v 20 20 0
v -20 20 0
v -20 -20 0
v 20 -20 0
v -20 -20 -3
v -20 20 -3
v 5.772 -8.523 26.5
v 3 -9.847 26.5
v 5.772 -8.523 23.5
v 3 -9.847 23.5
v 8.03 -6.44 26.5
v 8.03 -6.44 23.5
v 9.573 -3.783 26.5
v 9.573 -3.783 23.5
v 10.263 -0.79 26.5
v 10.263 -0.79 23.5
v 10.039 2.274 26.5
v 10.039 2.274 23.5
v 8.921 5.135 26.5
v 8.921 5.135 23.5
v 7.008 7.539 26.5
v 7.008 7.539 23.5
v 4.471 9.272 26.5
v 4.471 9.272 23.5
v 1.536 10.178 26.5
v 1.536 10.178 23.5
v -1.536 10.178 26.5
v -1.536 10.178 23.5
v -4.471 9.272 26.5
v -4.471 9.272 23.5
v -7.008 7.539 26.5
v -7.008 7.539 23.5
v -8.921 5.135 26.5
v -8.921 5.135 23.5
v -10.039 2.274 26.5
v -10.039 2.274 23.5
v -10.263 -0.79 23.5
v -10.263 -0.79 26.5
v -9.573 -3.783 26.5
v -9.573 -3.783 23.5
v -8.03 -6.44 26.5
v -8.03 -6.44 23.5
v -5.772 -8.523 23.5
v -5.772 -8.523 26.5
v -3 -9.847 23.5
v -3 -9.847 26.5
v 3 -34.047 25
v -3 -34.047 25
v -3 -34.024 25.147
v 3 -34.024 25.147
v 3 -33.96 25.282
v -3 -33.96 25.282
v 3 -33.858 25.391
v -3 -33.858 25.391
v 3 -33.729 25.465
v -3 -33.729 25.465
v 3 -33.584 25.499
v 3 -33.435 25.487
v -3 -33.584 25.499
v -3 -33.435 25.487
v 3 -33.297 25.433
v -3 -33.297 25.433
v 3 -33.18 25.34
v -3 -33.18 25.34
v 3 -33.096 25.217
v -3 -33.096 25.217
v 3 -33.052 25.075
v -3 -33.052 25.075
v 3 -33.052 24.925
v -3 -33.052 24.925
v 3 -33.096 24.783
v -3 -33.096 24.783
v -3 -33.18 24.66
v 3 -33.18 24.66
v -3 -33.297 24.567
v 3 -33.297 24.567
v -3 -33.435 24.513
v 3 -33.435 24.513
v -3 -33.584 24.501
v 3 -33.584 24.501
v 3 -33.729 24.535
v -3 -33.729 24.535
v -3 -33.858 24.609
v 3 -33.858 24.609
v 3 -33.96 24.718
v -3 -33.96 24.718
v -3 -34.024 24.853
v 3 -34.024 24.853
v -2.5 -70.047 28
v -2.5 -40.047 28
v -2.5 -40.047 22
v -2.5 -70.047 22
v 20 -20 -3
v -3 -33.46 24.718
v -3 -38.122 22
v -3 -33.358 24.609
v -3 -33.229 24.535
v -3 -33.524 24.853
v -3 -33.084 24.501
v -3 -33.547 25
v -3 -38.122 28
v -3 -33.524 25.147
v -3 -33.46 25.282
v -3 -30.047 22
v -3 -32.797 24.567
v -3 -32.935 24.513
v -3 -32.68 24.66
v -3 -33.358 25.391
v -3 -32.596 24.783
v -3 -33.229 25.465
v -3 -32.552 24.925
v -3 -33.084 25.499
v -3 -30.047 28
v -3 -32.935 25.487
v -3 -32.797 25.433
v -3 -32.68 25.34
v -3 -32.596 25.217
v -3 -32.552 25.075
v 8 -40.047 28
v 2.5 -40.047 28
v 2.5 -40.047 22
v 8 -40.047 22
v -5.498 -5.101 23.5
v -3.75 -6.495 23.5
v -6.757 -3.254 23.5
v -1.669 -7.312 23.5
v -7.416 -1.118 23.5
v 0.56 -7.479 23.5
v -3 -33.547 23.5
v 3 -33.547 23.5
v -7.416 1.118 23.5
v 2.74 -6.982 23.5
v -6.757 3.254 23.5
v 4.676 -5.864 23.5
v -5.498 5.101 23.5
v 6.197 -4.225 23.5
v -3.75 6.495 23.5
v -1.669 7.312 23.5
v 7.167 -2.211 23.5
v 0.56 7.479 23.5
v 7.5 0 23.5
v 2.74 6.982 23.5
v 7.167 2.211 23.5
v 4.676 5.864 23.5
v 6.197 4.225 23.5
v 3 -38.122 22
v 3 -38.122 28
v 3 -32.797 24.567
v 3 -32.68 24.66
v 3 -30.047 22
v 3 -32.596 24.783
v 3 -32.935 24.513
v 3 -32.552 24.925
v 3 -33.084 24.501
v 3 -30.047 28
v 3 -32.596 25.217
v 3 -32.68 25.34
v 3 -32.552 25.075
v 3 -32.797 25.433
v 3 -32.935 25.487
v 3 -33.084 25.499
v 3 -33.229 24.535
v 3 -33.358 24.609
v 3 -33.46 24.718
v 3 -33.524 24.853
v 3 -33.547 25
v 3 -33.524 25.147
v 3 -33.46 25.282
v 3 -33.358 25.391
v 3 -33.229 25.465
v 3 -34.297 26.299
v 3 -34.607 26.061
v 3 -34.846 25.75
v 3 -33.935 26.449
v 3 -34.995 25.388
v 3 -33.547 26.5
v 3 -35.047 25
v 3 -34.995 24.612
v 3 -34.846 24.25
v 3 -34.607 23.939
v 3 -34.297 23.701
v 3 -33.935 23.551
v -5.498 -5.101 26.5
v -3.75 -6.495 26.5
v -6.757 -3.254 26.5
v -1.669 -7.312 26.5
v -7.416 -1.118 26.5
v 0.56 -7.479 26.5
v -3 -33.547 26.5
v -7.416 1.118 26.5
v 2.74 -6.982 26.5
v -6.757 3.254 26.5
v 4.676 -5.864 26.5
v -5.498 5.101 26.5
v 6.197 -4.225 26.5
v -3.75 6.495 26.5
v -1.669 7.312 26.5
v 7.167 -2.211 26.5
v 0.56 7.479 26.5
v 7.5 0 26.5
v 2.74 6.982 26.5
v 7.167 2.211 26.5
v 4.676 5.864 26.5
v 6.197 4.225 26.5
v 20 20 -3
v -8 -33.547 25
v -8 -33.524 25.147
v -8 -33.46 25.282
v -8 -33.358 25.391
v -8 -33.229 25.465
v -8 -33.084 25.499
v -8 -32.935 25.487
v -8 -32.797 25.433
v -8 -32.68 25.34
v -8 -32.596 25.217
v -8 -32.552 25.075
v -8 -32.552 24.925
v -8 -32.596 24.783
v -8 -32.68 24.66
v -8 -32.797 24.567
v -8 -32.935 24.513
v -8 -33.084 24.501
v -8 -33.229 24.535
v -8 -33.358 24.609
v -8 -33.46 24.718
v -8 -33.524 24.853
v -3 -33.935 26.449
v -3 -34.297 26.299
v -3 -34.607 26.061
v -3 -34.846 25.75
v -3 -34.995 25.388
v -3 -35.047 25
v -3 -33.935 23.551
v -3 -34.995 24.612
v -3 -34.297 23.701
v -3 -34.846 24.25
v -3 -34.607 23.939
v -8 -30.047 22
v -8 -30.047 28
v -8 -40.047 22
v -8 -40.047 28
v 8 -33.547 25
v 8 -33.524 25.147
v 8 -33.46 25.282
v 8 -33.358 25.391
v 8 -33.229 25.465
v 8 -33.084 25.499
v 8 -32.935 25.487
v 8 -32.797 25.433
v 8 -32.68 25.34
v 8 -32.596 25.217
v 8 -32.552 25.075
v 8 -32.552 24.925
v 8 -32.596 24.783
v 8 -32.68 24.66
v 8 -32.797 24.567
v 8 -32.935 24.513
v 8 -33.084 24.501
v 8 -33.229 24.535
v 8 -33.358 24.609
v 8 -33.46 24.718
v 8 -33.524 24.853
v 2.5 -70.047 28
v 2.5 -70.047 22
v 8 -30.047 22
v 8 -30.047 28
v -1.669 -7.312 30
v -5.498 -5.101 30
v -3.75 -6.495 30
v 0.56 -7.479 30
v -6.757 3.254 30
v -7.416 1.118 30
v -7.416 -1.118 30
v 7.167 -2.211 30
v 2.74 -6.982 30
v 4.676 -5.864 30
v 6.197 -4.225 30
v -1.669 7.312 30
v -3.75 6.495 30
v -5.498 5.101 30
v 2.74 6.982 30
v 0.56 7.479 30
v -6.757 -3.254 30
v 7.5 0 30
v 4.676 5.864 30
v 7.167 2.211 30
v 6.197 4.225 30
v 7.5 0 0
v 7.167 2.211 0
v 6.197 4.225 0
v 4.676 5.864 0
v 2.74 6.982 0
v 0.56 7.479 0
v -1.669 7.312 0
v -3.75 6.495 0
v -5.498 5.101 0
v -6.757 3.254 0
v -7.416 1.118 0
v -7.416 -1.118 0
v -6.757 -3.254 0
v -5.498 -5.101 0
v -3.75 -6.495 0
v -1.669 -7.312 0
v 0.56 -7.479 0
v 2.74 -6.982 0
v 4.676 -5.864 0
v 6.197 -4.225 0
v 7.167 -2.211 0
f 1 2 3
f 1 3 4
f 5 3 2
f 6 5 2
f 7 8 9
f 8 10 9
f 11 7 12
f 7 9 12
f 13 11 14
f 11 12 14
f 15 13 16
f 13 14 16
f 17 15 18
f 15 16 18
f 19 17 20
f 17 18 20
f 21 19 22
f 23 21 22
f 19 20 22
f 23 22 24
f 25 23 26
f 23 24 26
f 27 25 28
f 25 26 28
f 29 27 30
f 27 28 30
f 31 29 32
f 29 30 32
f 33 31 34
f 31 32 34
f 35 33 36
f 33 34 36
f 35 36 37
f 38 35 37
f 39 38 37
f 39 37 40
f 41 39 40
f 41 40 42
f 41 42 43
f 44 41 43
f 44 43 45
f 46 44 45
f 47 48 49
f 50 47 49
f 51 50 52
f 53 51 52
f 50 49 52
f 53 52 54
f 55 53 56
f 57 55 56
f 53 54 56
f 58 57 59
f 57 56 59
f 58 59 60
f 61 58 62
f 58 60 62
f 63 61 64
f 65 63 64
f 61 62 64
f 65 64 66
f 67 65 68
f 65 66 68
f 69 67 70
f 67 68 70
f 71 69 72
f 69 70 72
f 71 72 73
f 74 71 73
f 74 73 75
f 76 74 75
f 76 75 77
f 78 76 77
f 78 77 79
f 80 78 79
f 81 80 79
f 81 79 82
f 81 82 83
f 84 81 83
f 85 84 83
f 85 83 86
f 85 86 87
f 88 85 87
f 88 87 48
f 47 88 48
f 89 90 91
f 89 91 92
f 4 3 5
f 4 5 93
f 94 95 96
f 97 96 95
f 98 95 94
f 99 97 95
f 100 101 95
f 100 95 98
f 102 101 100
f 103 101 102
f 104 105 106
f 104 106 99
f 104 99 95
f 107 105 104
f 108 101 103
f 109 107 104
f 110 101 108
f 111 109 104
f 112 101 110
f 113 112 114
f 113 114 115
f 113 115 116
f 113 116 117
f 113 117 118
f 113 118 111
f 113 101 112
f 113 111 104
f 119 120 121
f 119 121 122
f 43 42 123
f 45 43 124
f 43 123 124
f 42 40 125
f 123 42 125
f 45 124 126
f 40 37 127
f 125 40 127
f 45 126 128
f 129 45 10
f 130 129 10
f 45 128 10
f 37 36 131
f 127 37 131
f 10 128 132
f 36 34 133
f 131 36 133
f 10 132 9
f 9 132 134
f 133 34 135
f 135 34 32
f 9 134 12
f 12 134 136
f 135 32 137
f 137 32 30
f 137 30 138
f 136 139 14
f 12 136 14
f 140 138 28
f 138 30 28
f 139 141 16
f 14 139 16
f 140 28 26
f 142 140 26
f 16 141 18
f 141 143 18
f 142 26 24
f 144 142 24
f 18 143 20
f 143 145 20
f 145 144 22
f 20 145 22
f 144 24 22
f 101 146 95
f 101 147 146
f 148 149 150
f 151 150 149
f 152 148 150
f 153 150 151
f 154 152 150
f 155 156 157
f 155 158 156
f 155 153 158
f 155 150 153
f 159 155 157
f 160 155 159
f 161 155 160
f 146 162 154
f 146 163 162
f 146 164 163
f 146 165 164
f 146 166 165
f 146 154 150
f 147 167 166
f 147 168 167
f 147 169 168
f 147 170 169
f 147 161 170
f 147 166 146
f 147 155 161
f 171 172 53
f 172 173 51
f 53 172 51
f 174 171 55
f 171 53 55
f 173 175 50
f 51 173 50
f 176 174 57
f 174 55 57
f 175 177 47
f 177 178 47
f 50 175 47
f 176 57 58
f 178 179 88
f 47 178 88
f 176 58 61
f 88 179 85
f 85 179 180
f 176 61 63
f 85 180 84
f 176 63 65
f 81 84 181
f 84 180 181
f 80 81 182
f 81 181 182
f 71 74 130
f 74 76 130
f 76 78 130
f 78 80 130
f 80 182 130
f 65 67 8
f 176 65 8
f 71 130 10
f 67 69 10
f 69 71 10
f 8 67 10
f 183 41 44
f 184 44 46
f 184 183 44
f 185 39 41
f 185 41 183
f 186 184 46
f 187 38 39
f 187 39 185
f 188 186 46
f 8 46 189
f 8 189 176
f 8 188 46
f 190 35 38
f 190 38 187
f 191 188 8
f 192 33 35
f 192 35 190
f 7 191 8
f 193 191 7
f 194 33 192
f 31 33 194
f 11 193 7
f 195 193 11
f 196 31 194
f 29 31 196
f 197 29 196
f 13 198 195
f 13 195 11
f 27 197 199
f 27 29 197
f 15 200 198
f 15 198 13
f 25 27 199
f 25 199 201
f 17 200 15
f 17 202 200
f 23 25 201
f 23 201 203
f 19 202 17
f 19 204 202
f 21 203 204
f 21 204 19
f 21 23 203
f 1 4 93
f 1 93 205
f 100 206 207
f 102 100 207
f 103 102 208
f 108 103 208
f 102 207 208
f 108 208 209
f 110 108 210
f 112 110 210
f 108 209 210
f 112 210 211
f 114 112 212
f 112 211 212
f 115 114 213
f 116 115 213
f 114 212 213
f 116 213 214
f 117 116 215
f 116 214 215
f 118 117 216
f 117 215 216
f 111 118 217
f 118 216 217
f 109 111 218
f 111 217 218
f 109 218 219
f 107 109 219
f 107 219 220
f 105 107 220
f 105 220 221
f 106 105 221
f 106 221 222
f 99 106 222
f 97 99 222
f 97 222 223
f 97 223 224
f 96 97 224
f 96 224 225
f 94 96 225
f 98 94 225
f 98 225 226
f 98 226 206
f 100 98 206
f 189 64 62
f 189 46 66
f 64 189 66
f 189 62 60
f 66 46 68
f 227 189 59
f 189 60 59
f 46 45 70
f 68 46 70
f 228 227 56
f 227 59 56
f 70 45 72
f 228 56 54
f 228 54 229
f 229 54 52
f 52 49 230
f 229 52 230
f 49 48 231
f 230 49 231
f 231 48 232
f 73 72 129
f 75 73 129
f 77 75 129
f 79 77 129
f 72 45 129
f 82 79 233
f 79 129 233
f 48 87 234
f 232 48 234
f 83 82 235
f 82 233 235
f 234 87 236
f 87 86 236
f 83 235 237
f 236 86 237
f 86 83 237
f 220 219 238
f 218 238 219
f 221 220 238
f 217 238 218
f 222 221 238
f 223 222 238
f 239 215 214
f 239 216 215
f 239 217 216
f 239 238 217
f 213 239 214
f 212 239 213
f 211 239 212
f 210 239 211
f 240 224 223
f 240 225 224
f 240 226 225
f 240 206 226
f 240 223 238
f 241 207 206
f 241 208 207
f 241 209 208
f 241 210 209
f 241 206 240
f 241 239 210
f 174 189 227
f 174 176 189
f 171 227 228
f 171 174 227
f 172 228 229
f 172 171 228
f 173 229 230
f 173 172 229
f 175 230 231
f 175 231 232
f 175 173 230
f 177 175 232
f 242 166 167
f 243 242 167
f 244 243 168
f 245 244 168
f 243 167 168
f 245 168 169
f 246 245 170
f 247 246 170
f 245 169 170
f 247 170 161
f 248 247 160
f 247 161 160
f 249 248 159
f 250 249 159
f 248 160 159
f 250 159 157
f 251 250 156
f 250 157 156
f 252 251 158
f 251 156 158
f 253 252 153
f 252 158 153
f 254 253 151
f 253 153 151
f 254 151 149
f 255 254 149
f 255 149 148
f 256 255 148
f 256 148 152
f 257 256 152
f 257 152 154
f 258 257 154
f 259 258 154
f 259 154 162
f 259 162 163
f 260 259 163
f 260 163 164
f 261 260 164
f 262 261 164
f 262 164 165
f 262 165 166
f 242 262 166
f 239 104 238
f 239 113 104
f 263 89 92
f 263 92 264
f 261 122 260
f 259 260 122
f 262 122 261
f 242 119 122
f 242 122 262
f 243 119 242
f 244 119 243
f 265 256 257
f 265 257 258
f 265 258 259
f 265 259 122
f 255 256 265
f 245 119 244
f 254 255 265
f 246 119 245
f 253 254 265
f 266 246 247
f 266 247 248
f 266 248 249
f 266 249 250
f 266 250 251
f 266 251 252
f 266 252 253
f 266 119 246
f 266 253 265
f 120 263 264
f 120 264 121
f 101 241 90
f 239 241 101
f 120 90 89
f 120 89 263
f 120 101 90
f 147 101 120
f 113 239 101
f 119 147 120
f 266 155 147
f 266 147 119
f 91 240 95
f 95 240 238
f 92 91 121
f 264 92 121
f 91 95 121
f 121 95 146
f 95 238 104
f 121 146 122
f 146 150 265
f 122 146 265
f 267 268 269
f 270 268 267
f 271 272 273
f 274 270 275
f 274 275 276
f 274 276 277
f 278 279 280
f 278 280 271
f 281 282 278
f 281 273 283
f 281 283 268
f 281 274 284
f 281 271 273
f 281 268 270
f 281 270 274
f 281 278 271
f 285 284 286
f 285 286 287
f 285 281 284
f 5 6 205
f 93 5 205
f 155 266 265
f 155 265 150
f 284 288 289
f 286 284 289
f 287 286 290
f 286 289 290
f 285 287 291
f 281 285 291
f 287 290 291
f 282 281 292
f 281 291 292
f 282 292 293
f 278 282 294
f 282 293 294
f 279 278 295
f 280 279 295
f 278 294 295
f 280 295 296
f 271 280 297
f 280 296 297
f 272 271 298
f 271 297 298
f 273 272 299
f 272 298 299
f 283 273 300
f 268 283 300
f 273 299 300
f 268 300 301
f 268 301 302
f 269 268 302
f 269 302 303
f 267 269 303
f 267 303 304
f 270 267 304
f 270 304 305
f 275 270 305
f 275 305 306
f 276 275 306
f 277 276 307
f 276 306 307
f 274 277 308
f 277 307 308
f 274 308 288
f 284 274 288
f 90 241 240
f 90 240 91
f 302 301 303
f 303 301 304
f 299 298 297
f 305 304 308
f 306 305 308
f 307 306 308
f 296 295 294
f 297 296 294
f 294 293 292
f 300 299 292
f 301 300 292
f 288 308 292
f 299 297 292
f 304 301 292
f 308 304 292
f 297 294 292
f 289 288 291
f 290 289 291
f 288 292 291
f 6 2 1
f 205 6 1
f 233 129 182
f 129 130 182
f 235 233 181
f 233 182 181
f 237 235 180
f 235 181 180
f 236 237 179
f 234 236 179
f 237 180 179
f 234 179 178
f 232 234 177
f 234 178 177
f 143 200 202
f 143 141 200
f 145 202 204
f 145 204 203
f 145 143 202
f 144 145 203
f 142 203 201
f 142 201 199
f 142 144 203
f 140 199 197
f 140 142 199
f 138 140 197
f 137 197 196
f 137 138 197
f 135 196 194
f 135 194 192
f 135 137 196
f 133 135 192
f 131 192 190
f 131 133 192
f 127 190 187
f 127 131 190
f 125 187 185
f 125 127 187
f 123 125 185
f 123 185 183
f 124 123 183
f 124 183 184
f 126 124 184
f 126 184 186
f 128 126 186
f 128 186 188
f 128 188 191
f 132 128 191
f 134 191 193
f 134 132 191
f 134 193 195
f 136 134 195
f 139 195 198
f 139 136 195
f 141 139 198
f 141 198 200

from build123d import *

# Parameters (mm, degrees)
F0_W      = 40
F0_H      = 40
F1_DEPTH  = 3
F2_R      = 7.5
F3_DEPTH  = 30
F5_R      = 7.5
F6_DEPTH  = 1.5
F8_DEPTH  = 3
F9_R      = 1.49999
F10_R     = 0.5
F11_DEPTH = 23.001
F12_R     = 0.5
F13_DEPTH = 28.001


# Not quite as in the source:
# - a fillet or chamfer is up to 0.001 mm smaller than in the source, because OpenCascade refuses the exact size


with BuildPart() as f1:
    # F0 (on Top) → F1 (new body)
    with BuildSketch(Plane.XY):
        Rectangle(F0_W, F0_H)
    extrude(amount=-F1_DEPTH)


with BuildPart() as f3:
    # F2 (on face) → F3 (new body)
    with BuildSketch(Plane.XY):
        Circle(F2_R)
    extrude(amount=F3_DEPTH)


with BuildPart() as f6:
    # F5 (on offset) → F6 (new body, symmetric)
    with BuildSketch(Plane.XY.offset(25)):
        with BuildLine():
            Line((3, -35.0465811789), (3, -9.846652891))
            ThreePointArc((3, -9.846652891), (0, 10.2935209309), (-3, -9.846652891))
            Line((-3, -9.846652891), (-3, -35.0465811789))
            Line((-3, -35.0465811789), (3, -35.0465811789))
        make_face()
        Circle(F5_R, mode=Mode.SUBTRACT)
    extrude(amount=-F6_DEPTH, both=True)

    # F9 (radius 1.5 in the source; OpenCascade refuses exactly that, so slightly less here)
    f9_edges = [f6.edges().sort_by_distance(p)[0] for p in [
        (0, -35.046581, 23.5),
        (0, -35.046581, 26.5),
    ]]
    fillet(f9_edges, radius=F9_R)

    # F10 (on face) → F11 (cut, through all)
    with BuildSketch(Plane(origin=(-3, 0, 0), x_dir=(0, -1, 0), z_dir=(-1, 0, 0))):
        with Locations((33.5465811789, 25)):
            Circle(F10_R)
    extrude(amount=-F11_DEPTH, mode=Mode.SUBTRACT)


with BuildPart() as f8:
    # F7 (on offset) → F8 (new body, symmetric)
    with BuildSketch(Plane.XY.offset(25)):
        Polygon((-3, -35.0465811789), (-3, -30.0465811789), (-8, -30.0465811789), (-8, -40.0465811789), (-2.5, -40.0465811789), (-2.5, -70.0465811789), (2.5, -70.0465811789), (2.5, -40.0465811789), (8, -40.0465811789), (8, -30.0465811789), (3, -30.0465811789), (3, -35.0465811789), (3, -38.1220765412), (-3, -38.1220765412), align=None)
    extrude(amount=F8_DEPTH, both=True)

    # F12 (on face) → F13 (cut, through all)
    with BuildSketch(Plane(origin=(-8, 0, 0), x_dir=(0, -1, 0), z_dir=(-1, 0, 0))):
        with Locations((33.0465811789, 25)):
            Circle(F12_R)
    extrude(amount=-F13_DEPTH, mode=Mode.SUBTRACT)


solid = Compound([f1.part, f3.part, f6.part, f8.part])
